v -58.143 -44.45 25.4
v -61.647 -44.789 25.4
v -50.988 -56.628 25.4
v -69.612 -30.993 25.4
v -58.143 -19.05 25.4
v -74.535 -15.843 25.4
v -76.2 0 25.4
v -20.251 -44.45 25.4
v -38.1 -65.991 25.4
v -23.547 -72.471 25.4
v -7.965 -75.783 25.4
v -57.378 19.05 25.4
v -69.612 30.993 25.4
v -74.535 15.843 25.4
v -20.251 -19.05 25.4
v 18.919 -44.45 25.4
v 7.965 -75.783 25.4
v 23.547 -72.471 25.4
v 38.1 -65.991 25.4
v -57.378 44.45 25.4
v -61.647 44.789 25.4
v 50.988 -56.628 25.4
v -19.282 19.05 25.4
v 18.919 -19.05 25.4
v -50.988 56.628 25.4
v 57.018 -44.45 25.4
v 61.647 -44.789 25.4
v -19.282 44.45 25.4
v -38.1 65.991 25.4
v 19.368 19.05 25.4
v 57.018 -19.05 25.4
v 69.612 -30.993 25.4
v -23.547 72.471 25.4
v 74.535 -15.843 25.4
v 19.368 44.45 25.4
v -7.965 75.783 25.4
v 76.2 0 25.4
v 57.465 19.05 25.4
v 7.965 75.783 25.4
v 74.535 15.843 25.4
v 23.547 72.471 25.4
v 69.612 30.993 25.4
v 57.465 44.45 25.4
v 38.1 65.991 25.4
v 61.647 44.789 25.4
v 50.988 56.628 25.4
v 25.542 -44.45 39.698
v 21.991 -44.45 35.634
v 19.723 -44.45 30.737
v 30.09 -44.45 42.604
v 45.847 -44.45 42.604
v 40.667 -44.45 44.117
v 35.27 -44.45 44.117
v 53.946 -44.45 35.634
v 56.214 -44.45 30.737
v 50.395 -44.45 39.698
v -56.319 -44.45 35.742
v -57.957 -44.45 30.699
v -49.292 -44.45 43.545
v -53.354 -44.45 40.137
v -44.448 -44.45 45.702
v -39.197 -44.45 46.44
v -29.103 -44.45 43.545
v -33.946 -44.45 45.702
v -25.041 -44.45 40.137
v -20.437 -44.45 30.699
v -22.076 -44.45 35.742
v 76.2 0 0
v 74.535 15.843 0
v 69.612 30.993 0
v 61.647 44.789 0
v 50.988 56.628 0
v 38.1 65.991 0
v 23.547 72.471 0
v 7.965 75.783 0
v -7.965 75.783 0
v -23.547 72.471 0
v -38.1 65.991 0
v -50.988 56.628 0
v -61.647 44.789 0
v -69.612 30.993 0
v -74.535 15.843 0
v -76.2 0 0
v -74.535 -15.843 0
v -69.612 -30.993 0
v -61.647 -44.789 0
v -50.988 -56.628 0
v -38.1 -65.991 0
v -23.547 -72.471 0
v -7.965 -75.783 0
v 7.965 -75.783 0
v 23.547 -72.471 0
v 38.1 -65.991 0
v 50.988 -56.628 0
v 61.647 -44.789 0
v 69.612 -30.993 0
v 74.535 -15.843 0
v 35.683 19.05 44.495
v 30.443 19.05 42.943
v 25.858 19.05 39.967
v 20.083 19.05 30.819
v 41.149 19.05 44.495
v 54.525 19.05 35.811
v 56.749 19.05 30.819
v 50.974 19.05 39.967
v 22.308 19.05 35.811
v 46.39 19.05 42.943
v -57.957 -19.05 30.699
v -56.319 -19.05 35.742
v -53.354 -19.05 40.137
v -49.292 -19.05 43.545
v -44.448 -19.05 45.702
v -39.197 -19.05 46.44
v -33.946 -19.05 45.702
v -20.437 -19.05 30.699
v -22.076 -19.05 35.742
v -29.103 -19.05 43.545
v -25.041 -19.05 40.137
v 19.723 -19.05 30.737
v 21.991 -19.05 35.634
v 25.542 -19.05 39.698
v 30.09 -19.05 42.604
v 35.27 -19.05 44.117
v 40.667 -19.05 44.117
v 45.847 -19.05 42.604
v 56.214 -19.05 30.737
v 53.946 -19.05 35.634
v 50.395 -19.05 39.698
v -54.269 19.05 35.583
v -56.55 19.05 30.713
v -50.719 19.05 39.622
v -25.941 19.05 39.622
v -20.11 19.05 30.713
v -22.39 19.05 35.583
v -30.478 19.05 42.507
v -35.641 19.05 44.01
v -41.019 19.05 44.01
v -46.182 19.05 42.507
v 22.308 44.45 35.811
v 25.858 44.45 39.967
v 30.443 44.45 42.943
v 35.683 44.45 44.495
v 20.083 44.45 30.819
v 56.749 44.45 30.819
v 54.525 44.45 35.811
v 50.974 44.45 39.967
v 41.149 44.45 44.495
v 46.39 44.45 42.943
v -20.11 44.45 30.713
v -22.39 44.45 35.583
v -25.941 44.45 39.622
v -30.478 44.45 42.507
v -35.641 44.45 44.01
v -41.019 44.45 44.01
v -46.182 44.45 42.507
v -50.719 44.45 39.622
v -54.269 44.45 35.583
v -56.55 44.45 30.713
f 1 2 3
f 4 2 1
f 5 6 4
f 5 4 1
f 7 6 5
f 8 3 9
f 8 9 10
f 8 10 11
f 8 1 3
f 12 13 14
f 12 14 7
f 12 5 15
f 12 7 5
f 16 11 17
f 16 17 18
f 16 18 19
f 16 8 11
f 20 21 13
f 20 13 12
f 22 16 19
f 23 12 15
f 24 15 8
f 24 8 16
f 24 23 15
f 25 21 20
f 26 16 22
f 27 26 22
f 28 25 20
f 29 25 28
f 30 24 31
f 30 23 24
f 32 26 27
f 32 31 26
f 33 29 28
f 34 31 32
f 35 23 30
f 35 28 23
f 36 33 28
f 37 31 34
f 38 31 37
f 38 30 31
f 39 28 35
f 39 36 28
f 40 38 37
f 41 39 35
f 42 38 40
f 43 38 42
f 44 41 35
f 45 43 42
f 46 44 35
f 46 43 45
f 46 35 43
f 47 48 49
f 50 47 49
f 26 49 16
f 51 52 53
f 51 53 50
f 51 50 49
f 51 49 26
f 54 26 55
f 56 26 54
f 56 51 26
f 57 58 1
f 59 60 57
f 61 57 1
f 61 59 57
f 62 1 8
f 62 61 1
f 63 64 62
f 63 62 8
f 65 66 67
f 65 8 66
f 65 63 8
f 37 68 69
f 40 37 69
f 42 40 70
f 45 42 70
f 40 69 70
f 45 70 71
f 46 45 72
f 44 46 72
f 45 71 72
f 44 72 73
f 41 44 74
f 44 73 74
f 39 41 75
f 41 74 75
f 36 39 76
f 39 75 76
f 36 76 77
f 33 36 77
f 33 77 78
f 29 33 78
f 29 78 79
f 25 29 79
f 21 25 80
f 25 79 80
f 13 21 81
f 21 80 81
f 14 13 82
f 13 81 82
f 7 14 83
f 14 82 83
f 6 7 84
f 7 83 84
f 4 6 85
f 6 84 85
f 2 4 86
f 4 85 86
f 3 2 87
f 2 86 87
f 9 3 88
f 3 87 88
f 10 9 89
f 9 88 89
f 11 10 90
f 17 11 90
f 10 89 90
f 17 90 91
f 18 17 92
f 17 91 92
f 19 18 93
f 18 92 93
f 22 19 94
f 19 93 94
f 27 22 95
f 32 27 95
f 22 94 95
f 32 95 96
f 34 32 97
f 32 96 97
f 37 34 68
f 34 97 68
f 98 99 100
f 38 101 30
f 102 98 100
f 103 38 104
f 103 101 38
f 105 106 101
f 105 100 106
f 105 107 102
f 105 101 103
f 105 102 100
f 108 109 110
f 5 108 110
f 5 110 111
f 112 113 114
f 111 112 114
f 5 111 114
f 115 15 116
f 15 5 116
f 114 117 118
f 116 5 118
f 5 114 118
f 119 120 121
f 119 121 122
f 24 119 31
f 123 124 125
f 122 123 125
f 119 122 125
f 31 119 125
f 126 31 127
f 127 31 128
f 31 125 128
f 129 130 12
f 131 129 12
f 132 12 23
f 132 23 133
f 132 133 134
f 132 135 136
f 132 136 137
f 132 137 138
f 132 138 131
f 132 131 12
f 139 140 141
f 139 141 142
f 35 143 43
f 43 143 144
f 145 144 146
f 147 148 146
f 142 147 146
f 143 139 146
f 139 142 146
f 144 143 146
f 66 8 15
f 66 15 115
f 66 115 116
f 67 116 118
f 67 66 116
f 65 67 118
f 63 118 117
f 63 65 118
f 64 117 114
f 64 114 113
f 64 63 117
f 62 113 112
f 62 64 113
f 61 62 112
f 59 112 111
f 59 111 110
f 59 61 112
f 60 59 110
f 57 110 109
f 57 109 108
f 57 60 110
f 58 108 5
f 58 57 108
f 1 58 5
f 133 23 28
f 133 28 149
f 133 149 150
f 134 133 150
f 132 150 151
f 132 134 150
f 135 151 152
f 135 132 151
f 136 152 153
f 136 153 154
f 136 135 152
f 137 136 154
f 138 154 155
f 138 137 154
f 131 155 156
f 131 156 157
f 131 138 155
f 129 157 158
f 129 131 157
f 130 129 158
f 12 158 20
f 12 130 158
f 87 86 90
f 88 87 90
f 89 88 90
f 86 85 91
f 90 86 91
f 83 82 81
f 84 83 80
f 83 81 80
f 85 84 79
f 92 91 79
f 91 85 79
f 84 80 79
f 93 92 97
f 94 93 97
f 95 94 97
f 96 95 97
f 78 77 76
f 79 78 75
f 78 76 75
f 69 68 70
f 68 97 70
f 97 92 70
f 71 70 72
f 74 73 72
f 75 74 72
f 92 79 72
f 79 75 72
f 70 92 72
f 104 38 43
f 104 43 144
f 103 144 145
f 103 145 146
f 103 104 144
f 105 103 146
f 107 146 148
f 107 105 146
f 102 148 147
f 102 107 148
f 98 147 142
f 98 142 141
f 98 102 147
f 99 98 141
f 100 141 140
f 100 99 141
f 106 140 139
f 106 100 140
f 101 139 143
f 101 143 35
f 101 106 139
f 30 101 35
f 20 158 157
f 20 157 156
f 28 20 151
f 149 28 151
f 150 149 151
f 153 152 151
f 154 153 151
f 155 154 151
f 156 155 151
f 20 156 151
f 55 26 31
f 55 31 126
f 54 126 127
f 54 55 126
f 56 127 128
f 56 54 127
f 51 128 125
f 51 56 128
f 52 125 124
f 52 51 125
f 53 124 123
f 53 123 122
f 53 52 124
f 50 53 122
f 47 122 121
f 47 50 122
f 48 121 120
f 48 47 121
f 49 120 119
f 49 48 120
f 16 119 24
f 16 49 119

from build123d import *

# Parameters (mm, degrees)
F0_R      = 76.2
F1_DEPTH  = 25.4
F4_R      = 19.05
F5_DEPTH  = 12.7
F7_R      = 19.05
F8_DEPTH  = 12.7
F9_R      = 19.05
F10_DEPTH = 12.7
F11_R     = 19.05
F12_DEPTH = 12.7


with BuildPart() as f1:
    # F0 (on Top) → F1 (new body)
    with BuildSketch(Plane.XY):
        Circle(F0_R)
    extrude(amount=F1_DEPTH)

    # F4 (on plane+point) → F5 (join, symmetric)
    with BuildSketch(Plane.XZ.offset(-31.75)):
        with Locations((38.4162291884, 25.6418008357)):
            Circle(F4_R)
    extrude(amount=F5_DEPTH, both=True)

    # F7 (on plane+point) → F8 (join, symmetric)
    with BuildSketch(Plane.XZ.offset(31.75)):
        with Locations((37.968441844, 25.2595245838)):
            Circle(F7_R)
    extrude(amount=F8_DEPTH, both=True)

    # F9 (on plane+point) → F10 (join, symmetric)
    with BuildSketch(Plane.XZ.offset(-31.75)):
        with Locations((-38.3299067616, 25.1507181674)):
            Circle(F9_R)
    extrude(amount=F10_DEPTH, both=True)

    # F11 (on plane+point) → F12 (join, symmetric)
    with BuildSketch(Plane.XZ.offset(31.75)):
        with Locations((-39.1971170902, 27.3897647858)):
            Circle(F11_R)
    extrude(amount=F12_DEPTH, both=True)


solid = f1.part
